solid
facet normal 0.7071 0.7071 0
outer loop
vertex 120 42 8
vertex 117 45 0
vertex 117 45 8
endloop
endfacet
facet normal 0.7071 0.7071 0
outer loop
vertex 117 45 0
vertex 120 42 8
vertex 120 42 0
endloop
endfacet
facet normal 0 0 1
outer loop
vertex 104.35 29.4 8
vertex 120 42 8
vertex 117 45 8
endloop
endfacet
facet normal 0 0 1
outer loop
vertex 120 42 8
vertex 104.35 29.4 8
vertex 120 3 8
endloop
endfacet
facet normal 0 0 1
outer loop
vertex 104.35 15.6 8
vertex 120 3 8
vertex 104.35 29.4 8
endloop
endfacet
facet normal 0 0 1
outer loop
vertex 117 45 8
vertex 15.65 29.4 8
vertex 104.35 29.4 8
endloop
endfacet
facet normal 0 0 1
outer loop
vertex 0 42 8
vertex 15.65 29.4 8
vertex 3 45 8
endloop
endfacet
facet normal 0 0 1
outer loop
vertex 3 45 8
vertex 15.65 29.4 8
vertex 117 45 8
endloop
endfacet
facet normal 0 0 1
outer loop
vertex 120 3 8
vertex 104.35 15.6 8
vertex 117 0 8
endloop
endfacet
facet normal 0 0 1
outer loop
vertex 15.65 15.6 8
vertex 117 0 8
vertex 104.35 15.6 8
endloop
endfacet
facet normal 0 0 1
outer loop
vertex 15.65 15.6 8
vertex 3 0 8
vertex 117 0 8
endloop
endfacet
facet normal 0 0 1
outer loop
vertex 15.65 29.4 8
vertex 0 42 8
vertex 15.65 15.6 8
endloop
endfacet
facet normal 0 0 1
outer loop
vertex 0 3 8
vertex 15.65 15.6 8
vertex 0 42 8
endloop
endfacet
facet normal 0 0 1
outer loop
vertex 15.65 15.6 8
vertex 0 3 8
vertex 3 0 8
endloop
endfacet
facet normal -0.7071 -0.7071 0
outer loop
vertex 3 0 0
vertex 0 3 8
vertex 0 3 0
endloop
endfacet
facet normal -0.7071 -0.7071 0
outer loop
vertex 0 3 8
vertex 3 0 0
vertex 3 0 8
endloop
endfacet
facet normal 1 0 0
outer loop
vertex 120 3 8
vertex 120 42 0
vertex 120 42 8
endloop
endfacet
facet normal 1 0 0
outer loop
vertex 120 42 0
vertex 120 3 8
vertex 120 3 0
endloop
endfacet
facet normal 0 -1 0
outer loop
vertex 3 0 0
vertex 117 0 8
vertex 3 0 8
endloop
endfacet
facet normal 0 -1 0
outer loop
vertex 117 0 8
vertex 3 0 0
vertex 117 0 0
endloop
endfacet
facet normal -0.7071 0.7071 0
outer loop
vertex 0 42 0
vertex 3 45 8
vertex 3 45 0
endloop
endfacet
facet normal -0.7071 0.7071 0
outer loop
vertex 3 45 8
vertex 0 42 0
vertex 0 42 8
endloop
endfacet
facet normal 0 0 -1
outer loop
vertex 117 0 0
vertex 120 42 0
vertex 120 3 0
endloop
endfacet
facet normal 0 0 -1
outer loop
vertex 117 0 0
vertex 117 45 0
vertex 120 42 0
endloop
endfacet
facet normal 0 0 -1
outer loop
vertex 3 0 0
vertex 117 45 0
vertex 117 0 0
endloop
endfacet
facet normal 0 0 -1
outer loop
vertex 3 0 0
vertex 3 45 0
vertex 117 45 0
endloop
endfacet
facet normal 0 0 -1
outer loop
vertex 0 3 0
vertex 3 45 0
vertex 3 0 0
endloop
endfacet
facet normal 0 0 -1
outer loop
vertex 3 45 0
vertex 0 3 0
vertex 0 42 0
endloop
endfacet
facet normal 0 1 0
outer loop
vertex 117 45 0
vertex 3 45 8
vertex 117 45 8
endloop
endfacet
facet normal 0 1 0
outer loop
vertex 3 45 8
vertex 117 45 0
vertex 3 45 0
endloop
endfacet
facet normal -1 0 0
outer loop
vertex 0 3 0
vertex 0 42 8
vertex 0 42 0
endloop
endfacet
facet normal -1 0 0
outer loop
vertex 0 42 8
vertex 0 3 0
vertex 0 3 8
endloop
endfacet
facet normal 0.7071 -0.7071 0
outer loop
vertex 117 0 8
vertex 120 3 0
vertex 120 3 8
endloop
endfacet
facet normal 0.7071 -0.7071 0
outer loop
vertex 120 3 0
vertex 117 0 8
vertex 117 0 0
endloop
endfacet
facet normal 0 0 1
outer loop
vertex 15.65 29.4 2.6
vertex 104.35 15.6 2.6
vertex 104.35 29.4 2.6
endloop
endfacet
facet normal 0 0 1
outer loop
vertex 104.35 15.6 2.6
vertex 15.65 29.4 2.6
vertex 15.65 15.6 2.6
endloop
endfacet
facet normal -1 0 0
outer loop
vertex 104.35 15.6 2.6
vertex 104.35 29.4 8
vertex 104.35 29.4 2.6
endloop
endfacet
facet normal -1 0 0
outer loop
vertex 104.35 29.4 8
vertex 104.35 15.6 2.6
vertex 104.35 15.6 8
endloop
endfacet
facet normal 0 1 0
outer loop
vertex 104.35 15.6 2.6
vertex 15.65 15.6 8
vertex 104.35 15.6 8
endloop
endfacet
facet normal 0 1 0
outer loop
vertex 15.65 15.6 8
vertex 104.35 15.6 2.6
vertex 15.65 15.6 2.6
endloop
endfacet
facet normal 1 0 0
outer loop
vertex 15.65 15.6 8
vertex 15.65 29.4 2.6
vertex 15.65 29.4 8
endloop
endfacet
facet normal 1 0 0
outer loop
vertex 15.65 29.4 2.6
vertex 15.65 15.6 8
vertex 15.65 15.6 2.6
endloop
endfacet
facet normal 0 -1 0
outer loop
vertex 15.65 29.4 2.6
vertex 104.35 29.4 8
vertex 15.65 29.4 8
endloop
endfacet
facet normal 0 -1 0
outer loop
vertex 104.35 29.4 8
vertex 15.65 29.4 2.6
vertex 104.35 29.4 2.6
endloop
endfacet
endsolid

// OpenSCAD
$fn = 32;

// ----------------------------------------------------------------------
// Windowed plate: 1 voids, 120 x 45 x 8 mm
// ----------------------------------------------------------------------

// --- parameters (mm) ---
plate_l = 120;            // plate length, X
plate_w = 45;             // plate width, Y
plate_t = 8;              // plate thickness, Z
edge_margin = 10;         // wall from the plate edge to any window
win1_l = 88.7;            // window length
win1_w = 13.8;            // window width
depth_1 = 5.4;            // depth of void 1 (full thickness = through)
corner_c = 3;             // corner chamfer of the plate

profile = [[3, 0], [117, 0], [120, 3], [120, 42], [117, 45], [3, 45], [0, 42], [0, 3]];  // primary outline, 8 points, counter clockwise
void_1 = [[15.65, 15.6], [104.35, 15.6], [104.35, 29.4], [15.65, 29.4]];  // large central window, 4 points

// --- the one profile operation ---
difference() {
  linear_extrude(height = plate_t) polygon(points = profile);
  translate([0, 0, plate_t - depth_1])
    linear_extrude(height = depth_1 + 1) polygon(points = void_1);
}
